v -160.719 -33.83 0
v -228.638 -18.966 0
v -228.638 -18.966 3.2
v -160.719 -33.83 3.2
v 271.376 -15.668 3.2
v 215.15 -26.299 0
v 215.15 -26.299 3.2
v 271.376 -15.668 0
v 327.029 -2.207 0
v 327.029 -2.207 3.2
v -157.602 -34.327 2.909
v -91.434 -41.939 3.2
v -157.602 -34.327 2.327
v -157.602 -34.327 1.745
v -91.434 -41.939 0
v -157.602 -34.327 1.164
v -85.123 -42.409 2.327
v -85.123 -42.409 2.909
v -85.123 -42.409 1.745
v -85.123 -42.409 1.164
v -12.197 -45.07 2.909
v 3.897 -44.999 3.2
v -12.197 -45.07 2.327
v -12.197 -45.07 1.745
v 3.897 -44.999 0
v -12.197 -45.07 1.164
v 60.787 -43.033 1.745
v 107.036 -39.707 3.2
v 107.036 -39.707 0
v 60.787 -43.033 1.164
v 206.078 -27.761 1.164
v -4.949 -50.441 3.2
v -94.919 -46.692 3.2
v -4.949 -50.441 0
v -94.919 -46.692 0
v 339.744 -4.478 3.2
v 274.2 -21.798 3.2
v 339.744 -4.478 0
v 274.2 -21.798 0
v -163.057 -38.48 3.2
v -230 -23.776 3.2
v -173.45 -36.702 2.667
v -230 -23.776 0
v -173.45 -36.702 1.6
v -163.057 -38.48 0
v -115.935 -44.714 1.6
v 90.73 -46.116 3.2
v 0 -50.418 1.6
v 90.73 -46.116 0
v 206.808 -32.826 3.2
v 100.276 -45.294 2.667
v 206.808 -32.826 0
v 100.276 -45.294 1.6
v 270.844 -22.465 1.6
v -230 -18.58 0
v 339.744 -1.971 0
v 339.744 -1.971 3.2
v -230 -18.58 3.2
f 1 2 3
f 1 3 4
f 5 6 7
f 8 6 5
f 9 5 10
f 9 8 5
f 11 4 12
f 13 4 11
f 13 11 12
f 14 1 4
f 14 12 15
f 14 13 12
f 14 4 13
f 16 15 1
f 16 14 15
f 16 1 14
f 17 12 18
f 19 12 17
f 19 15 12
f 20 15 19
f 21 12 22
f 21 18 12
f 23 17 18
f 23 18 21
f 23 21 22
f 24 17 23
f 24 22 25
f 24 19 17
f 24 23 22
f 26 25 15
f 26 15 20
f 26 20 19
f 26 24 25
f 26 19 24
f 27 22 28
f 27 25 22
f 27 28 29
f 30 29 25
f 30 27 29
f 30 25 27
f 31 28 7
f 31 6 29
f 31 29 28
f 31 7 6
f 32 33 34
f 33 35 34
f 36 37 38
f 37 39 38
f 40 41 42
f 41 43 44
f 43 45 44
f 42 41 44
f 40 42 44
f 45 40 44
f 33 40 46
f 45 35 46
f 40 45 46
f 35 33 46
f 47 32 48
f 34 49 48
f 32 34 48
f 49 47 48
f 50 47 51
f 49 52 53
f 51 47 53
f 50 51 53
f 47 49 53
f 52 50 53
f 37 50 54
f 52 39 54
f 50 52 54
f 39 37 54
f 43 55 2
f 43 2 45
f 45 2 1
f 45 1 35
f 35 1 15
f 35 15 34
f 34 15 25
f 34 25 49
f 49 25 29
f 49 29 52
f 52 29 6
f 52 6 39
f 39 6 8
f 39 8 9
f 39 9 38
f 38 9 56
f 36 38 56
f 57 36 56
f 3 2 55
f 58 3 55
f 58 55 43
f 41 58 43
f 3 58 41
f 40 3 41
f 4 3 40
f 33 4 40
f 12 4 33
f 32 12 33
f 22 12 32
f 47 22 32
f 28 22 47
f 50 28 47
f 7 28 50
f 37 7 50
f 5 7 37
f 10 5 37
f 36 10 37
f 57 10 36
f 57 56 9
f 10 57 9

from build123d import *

# Parameters (mm, degrees)
BOSS_EXTRUDE1_DEPTH = 3.2


with BuildPart() as part:
    # Sketch1 → Boss-Extrude1 (new body)
    with BuildSketch(Plane.XY):
        with BuildLine():
            Line((339.743877836, -1.97092204), (327.028680724, -2.207358466))
            add(Edge.make_bspline(
                [(-228.638126642, -18.965520589), (-205.328000422, -25.564091644), (-169.71378297, -33.048286306), (-121.506682722, -39.379688009), (-73.01231088, -43.707584978), (-12.203336667, -45.868404467), (48.636352849, -44.036231472), (97.255668277, -40.66150775), (145.796442696, -36.203035302), (206.192712118, -28.441379937), (266.013860499, -17.275577293), (306.123232335, -7.743192742), (322.472206916, -3.440078745), (327.028680724, -2.207358466)],
                knots=[0, 0, 0, 0, 0.125, 0.1875, 0.25, 0.375, 0.5, 0.5625, 0.625, 0.75, 0.875, 0.9375, 0.961706413, 0.961706413, 0.961706413, 0.961706413], degree=3))
            Line((-228.638126642, -18.965520589), (-229.999999898, -18.580004982))
            Line((-229.999999898, -18.580004982), (-229.999999898, -23.776476963))
            add(Edge.make_bspline(
                [(-229.999999898, -23.776476963), (-187.624946823, -35.810765879), (-110.757346564, -47.307733367), (0.007380653, -52.092222889), (100.344733064, -46.361807952), (200.209241181, -34.219669393), (281.165485841, -22.017381692), (326.582041192, -8.953425301), (339.743877836, -4.478430193)],
                knots=[0, 0, 0, 0, 0.225071004, 0.395640197, 0.566277038, 0.737858903, 0.910958545, 0.981893873, 0.981893873, 0.981893873, 0.981893873], degree=3))
            Line((339.743877836, -4.478430193), (339.743877836, -1.97092204))
        make_face()
    extrude(amount=BOSS_EXTRUDE1_DEPTH)


solid = part.part
